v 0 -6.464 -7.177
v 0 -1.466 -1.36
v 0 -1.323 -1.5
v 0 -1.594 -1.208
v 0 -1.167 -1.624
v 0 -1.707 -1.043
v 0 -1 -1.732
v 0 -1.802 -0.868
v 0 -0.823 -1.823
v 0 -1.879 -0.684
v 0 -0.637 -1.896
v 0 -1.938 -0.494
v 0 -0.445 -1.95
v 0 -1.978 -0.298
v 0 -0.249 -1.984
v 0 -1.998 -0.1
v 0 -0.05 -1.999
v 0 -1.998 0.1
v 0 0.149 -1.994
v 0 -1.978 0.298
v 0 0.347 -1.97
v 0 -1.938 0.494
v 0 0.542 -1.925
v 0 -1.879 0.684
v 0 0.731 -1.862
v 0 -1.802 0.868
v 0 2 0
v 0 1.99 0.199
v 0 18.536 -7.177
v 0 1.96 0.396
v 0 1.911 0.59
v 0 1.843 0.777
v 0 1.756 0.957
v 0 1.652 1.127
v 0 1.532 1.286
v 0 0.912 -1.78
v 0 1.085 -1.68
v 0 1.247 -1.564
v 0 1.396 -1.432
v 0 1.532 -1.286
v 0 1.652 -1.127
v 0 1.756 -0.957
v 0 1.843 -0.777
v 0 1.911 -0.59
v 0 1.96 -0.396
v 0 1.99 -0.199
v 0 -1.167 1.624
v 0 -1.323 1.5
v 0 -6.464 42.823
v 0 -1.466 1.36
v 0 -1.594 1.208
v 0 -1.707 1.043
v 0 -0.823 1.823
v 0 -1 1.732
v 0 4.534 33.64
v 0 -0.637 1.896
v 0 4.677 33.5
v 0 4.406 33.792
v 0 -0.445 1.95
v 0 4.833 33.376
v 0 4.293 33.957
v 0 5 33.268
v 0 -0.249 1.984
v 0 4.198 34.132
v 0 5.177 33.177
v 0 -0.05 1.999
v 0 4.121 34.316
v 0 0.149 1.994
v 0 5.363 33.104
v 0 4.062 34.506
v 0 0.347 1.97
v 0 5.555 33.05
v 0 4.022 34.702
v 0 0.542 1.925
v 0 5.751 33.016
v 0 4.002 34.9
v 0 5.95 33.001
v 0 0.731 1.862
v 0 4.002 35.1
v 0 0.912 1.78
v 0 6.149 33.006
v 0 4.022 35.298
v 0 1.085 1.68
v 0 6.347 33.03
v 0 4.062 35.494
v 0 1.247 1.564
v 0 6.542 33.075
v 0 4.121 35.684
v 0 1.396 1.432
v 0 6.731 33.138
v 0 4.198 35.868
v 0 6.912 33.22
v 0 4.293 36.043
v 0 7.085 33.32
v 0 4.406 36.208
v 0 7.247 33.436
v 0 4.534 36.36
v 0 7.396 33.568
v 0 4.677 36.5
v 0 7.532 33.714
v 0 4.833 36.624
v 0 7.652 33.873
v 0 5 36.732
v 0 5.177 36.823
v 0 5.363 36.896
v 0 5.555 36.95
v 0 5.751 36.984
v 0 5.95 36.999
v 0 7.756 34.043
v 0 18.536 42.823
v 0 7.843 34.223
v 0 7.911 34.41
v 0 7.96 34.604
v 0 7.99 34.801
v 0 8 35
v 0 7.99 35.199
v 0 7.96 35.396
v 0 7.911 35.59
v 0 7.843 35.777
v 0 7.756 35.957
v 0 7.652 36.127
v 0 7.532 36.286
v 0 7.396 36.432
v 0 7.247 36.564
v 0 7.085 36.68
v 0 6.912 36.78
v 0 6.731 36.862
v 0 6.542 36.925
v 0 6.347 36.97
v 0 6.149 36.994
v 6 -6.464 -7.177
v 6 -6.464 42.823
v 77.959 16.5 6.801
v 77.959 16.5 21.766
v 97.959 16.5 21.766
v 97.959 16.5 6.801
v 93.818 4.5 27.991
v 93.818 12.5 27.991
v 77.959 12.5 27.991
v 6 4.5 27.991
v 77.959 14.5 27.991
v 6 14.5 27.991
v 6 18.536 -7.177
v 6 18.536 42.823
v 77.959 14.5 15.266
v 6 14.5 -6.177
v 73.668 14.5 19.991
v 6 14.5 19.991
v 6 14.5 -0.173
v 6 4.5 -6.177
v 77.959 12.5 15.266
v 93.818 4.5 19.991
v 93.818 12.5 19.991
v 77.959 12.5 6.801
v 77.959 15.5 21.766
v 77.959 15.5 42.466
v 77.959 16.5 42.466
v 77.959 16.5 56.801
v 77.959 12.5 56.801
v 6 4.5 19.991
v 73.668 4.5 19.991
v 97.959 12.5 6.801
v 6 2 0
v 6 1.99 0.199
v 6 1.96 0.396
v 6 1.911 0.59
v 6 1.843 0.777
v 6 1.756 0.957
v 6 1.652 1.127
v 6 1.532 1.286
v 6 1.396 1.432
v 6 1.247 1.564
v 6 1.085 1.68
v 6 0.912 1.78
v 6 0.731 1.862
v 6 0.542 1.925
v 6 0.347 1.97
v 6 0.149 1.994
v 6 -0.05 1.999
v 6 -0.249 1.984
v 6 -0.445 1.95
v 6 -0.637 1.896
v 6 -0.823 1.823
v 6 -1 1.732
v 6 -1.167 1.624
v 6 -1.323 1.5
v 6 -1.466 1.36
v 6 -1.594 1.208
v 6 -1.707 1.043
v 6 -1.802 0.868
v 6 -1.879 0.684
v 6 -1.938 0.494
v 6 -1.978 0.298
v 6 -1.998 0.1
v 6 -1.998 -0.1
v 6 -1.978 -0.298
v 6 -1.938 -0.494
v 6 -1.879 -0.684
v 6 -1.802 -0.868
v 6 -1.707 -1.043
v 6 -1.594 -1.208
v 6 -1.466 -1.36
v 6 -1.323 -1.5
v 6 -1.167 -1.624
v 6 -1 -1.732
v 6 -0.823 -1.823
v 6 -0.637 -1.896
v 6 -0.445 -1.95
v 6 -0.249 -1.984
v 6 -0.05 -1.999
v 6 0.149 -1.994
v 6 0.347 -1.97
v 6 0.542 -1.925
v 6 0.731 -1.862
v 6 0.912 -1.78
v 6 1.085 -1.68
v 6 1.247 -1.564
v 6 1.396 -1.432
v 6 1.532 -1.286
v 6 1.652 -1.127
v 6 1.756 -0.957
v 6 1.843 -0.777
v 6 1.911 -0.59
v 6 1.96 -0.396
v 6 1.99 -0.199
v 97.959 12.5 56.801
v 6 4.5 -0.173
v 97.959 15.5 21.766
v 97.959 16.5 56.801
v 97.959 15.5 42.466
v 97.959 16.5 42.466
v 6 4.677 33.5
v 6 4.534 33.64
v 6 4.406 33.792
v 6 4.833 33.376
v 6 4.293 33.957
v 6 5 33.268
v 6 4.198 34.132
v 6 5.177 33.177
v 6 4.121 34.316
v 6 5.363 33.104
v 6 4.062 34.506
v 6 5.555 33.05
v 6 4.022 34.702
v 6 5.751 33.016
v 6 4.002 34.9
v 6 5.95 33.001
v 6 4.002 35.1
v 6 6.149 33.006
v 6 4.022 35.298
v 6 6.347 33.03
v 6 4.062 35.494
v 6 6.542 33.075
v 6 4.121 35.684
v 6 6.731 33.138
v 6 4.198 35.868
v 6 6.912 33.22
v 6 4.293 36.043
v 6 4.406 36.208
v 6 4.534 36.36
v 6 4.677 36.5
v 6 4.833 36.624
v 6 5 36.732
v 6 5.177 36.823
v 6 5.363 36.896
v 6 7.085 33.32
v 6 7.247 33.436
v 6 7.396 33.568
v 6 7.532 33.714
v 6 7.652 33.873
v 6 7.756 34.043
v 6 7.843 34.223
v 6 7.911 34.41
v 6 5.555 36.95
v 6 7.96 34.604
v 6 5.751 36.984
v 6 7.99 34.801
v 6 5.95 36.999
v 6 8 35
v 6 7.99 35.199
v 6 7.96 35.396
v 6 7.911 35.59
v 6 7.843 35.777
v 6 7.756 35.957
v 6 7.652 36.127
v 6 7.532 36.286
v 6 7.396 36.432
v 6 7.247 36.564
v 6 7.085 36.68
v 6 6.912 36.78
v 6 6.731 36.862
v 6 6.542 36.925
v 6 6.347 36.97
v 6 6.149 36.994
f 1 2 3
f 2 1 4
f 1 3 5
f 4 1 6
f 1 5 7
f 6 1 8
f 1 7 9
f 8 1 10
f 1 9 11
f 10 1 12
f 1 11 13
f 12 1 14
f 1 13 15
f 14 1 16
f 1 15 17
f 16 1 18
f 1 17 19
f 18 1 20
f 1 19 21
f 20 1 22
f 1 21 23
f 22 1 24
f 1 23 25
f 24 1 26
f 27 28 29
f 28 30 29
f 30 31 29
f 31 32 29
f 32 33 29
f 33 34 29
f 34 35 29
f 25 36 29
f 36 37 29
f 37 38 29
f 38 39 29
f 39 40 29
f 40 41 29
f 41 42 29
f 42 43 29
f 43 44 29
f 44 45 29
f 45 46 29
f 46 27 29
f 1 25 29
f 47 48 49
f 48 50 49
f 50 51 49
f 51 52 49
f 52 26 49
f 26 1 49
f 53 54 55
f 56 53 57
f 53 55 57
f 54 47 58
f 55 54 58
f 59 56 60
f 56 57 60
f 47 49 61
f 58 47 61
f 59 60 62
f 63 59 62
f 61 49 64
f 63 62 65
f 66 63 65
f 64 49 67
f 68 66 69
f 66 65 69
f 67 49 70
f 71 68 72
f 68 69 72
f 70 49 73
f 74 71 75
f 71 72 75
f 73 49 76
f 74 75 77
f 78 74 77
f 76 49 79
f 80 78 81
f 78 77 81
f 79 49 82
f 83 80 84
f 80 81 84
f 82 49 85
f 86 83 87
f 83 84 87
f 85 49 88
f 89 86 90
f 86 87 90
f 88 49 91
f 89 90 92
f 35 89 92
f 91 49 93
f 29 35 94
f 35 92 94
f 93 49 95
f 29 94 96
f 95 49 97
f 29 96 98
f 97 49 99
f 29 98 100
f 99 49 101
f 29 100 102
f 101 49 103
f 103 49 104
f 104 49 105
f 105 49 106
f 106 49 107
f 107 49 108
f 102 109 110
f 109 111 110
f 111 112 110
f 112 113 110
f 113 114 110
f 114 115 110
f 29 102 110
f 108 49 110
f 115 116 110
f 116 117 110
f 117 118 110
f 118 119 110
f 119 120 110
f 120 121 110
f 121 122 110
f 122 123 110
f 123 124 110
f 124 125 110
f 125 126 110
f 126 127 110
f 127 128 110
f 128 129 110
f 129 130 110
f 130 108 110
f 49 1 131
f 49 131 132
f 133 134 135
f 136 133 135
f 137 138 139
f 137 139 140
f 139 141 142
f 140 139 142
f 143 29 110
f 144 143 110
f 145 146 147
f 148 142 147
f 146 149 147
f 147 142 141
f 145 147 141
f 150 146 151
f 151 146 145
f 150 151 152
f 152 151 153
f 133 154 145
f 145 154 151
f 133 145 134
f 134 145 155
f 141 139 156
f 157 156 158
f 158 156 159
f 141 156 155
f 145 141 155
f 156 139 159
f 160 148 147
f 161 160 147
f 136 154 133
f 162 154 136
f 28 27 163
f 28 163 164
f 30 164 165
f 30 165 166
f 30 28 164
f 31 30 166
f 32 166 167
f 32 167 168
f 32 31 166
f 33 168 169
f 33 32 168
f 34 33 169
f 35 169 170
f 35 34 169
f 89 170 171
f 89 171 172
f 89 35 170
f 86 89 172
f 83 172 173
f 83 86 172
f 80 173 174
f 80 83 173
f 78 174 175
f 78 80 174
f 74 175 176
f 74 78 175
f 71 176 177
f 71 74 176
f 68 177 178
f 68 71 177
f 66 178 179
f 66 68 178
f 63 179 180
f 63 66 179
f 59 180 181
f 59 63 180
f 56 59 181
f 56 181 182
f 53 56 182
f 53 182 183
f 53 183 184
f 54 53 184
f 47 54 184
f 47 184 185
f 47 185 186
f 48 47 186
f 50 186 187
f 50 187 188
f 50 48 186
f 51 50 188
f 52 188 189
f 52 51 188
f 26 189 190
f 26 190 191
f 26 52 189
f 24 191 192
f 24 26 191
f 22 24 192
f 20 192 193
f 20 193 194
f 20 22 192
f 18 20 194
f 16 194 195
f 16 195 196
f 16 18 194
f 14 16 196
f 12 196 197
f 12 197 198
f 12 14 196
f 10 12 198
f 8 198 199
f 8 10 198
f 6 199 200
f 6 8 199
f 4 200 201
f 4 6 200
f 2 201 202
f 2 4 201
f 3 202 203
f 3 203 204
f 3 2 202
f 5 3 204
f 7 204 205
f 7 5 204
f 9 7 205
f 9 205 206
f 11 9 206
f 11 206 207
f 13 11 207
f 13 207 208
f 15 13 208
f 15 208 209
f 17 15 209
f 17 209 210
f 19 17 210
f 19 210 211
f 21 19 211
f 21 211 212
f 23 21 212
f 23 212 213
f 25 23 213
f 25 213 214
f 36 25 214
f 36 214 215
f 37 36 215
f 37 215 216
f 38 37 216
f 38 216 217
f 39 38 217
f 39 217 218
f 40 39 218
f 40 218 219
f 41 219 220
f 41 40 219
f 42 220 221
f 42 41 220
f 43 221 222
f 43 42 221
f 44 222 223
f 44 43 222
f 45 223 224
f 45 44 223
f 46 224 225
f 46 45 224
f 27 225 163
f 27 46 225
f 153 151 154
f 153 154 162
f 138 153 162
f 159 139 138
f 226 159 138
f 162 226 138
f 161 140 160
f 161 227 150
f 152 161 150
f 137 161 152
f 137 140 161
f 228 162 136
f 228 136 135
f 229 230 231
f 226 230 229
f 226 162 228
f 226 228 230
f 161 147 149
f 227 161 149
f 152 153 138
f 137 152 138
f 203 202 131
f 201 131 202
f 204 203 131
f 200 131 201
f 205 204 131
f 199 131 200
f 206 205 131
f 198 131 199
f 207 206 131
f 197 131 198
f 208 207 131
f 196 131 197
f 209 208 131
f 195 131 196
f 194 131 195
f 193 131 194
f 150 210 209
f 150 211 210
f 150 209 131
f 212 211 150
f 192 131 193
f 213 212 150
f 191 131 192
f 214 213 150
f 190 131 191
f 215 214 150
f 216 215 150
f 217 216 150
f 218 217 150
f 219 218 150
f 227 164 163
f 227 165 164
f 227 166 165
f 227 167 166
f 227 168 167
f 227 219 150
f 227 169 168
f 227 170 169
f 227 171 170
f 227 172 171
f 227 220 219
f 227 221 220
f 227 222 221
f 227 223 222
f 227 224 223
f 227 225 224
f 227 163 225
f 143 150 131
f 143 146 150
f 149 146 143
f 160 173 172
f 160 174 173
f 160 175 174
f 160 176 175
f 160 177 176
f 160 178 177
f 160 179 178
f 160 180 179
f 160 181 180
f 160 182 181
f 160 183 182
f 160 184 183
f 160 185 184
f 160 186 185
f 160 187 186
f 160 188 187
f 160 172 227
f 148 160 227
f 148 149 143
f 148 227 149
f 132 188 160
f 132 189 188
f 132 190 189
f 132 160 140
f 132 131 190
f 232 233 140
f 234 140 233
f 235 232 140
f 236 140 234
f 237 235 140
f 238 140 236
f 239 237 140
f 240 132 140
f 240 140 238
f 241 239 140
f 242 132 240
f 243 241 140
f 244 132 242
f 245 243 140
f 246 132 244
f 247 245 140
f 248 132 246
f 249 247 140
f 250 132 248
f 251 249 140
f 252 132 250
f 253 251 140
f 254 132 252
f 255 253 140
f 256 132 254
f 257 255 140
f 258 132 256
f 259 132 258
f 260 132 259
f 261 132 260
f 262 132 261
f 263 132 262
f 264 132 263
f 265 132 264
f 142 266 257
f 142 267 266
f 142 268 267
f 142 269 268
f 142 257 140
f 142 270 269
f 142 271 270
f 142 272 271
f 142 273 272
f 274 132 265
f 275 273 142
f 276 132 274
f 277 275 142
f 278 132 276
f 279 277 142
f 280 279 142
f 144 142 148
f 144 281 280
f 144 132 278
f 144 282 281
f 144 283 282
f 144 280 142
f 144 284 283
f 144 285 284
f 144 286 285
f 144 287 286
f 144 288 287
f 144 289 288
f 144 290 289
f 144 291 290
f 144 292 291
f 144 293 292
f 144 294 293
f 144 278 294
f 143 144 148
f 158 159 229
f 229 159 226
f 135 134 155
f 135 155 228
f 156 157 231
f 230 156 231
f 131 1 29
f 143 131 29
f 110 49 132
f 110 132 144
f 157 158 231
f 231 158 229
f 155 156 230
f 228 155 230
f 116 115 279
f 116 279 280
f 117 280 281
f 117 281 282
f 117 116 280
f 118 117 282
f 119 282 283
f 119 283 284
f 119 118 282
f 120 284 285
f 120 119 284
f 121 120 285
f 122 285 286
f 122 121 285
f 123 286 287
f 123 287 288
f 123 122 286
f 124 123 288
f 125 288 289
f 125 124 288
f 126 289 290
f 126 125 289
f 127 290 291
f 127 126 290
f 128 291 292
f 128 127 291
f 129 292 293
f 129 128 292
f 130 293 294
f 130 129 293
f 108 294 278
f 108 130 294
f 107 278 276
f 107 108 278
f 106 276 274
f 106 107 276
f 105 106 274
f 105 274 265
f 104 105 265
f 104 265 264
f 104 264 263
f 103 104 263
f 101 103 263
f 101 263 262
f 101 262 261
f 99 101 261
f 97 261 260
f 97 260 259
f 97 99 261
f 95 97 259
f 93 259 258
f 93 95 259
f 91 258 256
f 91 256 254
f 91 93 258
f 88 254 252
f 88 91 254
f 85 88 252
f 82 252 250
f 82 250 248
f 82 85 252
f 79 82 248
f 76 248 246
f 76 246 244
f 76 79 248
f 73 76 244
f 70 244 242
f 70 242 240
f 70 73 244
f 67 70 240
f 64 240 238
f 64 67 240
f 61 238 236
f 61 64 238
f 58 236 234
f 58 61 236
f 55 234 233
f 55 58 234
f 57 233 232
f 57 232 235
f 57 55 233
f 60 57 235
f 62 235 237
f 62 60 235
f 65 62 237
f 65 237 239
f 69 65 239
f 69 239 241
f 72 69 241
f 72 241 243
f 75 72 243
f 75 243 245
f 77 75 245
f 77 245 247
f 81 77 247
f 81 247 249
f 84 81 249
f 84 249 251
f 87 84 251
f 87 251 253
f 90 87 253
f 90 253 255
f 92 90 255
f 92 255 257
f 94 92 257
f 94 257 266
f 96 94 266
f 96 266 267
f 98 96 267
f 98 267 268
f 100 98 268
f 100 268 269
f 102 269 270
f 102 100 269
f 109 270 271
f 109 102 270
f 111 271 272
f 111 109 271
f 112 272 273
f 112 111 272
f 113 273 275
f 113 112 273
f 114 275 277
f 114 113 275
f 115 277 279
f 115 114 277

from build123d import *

# Parameters (mm, degrees)
F0_W      = 25
F0_H      = 50
F0_R      = 2
F1_DEPTH  = 6
F4_DEPTH  = 10
F6_W      = 20
F6_H      = 50
F7_DEPTH  = 4
F9_W      = 30
F9_H      = 20.7
F10_DEPTH = 1


with BuildPart() as f1:
    # F0 (on Right) → F1 (new body)
    with BuildSketch(Plane.YZ):
        with Locations((6.035548, 17.82273)):
            Rectangle(F0_W, F0_H)
        Circle(F0_R, mode=Mode.SUBTRACT)
        with Locations((6, 35)):
            Circle(F0_R, mode=Mode.SUBTRACT)
    extrude(amount=F1_DEPTH)

    # F3 (on offset) → F4 (join)
    with BuildSketch(Plane.XZ.offset(-14.5)):
        Polygon((93.818079, 27.991471), (3.818079, 27.991471), (3.818079, 19.991471), (73.668075, 19.991471), (93.818079, 19.991471), align=None)
        Polygon((4.434382, -6.643867), (93.818079, 19.991471), (73.668075, 19.991471), (4.434382, -0.639392), align=None)
    extrude(amount=F4_DEPTH)

    # F6 (on offset) → F7 (join)
    with BuildSketch(Plane.XZ.offset(-12.5)):
        with Locations((87.958595, 31.800688)):
            Rectangle(F6_W, F6_H)
    extrude(amount=-F7_DEPTH)

    # F9 (on offset) → F10 (cut)
    with BuildSketch(Plane.XZ.offset(-16.5)):
        with Locations((87.881114, 32.116146)):
            Rectangle(F9_W, F9_H)
    extrude(amount=F10_DEPTH, mode=Mode.SUBTRACT)


solid = f1.part
